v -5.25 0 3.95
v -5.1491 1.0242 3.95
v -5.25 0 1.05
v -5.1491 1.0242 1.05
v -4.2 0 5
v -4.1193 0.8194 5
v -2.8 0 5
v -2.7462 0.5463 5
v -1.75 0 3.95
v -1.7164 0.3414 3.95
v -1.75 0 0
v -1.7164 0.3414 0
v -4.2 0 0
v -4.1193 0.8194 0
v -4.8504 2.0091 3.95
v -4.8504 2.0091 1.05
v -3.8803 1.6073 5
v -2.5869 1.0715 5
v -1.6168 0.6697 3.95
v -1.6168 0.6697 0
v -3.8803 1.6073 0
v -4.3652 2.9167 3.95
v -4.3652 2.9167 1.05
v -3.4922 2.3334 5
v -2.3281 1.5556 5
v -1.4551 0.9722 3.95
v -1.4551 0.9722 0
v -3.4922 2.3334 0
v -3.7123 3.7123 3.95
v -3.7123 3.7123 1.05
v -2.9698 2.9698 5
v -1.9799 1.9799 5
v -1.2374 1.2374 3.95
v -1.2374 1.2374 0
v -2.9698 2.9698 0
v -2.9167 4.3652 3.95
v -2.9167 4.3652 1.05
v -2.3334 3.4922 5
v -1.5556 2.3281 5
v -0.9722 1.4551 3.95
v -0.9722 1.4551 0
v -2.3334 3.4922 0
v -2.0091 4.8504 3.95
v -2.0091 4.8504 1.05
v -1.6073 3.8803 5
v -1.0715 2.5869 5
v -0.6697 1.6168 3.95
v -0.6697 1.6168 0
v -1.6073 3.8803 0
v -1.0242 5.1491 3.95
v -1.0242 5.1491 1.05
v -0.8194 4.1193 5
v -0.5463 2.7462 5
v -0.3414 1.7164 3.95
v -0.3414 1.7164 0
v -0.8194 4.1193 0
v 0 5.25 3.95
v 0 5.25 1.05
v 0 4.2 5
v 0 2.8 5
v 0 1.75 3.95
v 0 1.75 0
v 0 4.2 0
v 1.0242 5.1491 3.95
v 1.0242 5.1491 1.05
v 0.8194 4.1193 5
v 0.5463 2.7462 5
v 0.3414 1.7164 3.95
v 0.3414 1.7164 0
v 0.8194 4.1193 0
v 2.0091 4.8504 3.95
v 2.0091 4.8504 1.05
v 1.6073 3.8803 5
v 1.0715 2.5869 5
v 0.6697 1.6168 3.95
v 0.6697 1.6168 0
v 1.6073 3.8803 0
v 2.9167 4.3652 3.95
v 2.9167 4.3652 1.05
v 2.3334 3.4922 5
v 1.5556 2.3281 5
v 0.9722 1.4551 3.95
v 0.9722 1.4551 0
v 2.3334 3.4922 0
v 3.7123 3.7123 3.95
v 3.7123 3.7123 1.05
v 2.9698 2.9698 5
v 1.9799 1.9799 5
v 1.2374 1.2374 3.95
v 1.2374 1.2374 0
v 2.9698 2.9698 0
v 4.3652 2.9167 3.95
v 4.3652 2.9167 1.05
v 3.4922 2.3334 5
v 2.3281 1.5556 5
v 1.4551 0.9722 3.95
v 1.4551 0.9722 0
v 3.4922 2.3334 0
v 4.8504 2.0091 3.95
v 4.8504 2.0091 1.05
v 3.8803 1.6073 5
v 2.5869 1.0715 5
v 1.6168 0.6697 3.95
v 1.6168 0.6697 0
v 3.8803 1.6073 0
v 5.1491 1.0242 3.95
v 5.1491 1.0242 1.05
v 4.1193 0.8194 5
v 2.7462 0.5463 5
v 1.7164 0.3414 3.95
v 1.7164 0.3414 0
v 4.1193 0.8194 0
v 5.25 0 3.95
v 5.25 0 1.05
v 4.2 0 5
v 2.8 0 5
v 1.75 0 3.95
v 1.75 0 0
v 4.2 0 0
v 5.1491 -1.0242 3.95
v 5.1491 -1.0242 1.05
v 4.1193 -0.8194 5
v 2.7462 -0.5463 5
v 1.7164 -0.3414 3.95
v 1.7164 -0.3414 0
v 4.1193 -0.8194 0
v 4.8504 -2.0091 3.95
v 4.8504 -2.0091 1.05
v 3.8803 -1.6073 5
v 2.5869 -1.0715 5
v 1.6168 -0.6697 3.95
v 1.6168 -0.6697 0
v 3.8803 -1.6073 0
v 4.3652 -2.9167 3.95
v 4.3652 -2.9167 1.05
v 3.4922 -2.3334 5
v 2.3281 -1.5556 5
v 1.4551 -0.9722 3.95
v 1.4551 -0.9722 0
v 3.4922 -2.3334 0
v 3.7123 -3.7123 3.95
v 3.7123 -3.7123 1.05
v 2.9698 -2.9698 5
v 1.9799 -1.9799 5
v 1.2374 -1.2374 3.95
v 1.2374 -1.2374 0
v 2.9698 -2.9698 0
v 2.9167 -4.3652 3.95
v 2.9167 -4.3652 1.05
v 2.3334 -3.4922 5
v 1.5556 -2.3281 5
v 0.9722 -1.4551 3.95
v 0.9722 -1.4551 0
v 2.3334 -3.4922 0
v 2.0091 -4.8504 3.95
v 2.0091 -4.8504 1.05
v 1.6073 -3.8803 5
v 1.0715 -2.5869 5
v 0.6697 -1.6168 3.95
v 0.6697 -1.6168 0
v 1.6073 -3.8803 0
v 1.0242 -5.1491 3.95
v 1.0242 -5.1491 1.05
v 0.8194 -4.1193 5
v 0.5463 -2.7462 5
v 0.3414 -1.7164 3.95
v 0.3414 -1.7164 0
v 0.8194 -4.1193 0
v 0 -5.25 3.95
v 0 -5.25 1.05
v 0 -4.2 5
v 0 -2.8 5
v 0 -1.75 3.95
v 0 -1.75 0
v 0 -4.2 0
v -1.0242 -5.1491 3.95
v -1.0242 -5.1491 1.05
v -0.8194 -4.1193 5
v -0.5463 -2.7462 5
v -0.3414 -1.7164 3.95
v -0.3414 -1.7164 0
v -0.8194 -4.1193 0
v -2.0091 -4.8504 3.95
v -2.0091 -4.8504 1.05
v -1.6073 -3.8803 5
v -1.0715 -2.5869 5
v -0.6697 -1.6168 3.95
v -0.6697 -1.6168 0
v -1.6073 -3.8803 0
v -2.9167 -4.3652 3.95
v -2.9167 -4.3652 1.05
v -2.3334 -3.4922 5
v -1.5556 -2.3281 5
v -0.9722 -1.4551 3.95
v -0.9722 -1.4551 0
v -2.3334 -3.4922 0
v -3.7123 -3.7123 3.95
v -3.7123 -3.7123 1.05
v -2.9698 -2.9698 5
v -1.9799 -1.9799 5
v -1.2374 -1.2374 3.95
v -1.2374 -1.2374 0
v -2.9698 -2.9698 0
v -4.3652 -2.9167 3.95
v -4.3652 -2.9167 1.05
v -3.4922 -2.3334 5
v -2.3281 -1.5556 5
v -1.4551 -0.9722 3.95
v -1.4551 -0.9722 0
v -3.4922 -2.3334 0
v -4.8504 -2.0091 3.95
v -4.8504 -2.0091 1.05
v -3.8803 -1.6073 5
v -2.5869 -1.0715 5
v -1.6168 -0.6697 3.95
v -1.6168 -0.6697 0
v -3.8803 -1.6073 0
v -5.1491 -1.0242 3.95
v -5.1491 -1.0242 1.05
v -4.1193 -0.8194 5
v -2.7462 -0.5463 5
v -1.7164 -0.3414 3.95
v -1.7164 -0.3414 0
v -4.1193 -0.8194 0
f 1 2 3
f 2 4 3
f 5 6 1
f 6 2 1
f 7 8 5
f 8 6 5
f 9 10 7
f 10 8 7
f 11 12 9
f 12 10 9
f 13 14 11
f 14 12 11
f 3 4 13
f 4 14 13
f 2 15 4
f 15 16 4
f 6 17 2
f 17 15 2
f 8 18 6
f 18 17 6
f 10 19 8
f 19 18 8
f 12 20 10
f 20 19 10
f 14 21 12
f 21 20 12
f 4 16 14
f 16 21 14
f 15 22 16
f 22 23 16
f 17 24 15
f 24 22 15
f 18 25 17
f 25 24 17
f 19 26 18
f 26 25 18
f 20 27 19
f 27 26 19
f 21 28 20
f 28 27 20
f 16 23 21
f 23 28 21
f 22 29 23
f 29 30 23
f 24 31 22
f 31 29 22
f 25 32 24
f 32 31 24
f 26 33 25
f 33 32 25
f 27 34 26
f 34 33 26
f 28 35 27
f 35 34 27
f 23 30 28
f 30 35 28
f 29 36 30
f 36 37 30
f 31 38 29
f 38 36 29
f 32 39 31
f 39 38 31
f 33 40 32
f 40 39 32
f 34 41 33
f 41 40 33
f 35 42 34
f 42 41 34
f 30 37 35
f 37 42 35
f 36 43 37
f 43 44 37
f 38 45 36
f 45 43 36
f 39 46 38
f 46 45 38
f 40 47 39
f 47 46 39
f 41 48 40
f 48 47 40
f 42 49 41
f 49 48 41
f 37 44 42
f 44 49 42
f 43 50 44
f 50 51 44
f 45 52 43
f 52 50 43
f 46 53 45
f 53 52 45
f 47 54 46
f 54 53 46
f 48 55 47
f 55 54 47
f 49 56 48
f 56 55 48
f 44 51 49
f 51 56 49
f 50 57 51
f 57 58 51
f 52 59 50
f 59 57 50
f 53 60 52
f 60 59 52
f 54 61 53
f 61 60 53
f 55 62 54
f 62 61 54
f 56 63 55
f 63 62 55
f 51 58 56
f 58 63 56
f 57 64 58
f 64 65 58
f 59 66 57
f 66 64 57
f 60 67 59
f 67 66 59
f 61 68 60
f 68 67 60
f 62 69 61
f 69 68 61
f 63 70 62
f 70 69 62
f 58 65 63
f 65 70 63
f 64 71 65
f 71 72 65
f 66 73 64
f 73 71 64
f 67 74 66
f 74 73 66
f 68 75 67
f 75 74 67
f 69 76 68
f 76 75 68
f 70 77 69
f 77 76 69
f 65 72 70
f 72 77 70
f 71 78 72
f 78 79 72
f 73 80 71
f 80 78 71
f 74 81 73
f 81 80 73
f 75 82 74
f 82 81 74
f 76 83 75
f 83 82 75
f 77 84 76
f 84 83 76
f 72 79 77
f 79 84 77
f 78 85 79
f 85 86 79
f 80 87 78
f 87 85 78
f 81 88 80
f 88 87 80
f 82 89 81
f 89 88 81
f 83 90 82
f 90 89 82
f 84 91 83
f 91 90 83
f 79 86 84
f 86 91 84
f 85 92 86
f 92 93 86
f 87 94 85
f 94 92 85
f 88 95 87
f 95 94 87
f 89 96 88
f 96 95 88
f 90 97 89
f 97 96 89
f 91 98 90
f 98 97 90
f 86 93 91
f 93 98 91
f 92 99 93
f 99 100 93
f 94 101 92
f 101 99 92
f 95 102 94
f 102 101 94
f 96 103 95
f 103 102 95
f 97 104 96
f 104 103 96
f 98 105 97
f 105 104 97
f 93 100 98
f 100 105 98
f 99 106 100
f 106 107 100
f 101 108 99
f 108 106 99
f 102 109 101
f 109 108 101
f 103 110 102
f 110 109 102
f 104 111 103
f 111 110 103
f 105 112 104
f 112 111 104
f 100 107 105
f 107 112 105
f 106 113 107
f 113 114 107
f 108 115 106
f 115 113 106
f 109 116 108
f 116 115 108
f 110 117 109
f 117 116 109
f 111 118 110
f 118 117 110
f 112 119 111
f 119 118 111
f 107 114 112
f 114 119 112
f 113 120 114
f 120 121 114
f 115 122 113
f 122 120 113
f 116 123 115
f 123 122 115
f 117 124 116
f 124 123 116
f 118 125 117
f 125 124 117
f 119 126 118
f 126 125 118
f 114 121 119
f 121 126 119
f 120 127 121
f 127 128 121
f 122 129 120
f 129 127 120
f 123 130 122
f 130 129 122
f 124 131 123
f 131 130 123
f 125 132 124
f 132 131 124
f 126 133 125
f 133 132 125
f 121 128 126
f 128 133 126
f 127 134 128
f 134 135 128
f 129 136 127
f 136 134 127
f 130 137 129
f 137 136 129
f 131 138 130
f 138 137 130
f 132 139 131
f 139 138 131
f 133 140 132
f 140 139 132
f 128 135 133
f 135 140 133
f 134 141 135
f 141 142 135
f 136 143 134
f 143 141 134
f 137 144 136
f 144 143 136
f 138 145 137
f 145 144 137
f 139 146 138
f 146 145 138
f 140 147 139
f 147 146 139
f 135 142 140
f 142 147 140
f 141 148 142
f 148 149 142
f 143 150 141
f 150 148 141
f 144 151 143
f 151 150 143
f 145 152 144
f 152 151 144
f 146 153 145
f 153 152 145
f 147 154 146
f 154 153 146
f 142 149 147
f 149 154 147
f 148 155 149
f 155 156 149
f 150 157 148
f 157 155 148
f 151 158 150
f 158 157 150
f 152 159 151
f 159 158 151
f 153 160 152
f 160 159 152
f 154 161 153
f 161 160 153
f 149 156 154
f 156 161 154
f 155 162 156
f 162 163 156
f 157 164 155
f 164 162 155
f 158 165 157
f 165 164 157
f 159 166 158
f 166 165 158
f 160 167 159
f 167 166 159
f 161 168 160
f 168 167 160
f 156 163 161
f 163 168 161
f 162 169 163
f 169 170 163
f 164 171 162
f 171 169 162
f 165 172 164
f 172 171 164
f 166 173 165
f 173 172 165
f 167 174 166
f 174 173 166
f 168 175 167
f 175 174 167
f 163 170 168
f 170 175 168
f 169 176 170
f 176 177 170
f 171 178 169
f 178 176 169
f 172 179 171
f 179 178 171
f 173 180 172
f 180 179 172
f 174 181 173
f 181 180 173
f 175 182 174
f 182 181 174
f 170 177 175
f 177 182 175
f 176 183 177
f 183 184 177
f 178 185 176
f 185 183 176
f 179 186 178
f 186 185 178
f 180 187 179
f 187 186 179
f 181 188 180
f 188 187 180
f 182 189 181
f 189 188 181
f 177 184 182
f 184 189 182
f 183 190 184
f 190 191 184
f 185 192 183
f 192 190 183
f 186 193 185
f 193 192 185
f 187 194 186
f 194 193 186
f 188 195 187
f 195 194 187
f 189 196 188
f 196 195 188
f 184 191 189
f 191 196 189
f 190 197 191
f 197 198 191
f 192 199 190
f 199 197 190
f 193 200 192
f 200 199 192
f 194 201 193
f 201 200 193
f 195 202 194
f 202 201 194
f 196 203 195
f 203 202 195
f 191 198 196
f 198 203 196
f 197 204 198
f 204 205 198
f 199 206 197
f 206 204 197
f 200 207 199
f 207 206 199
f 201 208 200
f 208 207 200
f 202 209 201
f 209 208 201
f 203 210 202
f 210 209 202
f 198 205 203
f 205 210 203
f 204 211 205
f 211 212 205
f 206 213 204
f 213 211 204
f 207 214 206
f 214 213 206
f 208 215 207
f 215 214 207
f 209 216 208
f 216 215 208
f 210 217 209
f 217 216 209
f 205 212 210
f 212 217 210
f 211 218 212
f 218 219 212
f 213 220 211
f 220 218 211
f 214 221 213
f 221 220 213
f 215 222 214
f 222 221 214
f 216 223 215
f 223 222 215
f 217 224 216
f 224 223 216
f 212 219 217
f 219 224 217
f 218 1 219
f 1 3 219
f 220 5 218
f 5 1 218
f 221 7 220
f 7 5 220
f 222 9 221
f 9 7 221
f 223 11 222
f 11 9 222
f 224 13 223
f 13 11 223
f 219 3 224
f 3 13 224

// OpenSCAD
$fn = 32;

// ----------------------------------------------------------------------
// Form washer: chamfered washer, 10.5 mm outside, 3.5 mm bore
// ----------------------------------------------------------------------

// --- parameters (mm) ---
revolve_angle = 360;      // full turn around the Z axis
profile_points = 7;       // points of the closed outline

profile = [[1.75, 0], [4.2, 0], [5.25, 1.05], [5.25, 3.95], [4.2, 5], [2.8, 5], [1.75, 3.95]];  // single closed polygon, 7 points, counter clockwise

// --- the one profile operation ---
rotate_extrude(angle = revolve_angle) polygon(points = profile);
